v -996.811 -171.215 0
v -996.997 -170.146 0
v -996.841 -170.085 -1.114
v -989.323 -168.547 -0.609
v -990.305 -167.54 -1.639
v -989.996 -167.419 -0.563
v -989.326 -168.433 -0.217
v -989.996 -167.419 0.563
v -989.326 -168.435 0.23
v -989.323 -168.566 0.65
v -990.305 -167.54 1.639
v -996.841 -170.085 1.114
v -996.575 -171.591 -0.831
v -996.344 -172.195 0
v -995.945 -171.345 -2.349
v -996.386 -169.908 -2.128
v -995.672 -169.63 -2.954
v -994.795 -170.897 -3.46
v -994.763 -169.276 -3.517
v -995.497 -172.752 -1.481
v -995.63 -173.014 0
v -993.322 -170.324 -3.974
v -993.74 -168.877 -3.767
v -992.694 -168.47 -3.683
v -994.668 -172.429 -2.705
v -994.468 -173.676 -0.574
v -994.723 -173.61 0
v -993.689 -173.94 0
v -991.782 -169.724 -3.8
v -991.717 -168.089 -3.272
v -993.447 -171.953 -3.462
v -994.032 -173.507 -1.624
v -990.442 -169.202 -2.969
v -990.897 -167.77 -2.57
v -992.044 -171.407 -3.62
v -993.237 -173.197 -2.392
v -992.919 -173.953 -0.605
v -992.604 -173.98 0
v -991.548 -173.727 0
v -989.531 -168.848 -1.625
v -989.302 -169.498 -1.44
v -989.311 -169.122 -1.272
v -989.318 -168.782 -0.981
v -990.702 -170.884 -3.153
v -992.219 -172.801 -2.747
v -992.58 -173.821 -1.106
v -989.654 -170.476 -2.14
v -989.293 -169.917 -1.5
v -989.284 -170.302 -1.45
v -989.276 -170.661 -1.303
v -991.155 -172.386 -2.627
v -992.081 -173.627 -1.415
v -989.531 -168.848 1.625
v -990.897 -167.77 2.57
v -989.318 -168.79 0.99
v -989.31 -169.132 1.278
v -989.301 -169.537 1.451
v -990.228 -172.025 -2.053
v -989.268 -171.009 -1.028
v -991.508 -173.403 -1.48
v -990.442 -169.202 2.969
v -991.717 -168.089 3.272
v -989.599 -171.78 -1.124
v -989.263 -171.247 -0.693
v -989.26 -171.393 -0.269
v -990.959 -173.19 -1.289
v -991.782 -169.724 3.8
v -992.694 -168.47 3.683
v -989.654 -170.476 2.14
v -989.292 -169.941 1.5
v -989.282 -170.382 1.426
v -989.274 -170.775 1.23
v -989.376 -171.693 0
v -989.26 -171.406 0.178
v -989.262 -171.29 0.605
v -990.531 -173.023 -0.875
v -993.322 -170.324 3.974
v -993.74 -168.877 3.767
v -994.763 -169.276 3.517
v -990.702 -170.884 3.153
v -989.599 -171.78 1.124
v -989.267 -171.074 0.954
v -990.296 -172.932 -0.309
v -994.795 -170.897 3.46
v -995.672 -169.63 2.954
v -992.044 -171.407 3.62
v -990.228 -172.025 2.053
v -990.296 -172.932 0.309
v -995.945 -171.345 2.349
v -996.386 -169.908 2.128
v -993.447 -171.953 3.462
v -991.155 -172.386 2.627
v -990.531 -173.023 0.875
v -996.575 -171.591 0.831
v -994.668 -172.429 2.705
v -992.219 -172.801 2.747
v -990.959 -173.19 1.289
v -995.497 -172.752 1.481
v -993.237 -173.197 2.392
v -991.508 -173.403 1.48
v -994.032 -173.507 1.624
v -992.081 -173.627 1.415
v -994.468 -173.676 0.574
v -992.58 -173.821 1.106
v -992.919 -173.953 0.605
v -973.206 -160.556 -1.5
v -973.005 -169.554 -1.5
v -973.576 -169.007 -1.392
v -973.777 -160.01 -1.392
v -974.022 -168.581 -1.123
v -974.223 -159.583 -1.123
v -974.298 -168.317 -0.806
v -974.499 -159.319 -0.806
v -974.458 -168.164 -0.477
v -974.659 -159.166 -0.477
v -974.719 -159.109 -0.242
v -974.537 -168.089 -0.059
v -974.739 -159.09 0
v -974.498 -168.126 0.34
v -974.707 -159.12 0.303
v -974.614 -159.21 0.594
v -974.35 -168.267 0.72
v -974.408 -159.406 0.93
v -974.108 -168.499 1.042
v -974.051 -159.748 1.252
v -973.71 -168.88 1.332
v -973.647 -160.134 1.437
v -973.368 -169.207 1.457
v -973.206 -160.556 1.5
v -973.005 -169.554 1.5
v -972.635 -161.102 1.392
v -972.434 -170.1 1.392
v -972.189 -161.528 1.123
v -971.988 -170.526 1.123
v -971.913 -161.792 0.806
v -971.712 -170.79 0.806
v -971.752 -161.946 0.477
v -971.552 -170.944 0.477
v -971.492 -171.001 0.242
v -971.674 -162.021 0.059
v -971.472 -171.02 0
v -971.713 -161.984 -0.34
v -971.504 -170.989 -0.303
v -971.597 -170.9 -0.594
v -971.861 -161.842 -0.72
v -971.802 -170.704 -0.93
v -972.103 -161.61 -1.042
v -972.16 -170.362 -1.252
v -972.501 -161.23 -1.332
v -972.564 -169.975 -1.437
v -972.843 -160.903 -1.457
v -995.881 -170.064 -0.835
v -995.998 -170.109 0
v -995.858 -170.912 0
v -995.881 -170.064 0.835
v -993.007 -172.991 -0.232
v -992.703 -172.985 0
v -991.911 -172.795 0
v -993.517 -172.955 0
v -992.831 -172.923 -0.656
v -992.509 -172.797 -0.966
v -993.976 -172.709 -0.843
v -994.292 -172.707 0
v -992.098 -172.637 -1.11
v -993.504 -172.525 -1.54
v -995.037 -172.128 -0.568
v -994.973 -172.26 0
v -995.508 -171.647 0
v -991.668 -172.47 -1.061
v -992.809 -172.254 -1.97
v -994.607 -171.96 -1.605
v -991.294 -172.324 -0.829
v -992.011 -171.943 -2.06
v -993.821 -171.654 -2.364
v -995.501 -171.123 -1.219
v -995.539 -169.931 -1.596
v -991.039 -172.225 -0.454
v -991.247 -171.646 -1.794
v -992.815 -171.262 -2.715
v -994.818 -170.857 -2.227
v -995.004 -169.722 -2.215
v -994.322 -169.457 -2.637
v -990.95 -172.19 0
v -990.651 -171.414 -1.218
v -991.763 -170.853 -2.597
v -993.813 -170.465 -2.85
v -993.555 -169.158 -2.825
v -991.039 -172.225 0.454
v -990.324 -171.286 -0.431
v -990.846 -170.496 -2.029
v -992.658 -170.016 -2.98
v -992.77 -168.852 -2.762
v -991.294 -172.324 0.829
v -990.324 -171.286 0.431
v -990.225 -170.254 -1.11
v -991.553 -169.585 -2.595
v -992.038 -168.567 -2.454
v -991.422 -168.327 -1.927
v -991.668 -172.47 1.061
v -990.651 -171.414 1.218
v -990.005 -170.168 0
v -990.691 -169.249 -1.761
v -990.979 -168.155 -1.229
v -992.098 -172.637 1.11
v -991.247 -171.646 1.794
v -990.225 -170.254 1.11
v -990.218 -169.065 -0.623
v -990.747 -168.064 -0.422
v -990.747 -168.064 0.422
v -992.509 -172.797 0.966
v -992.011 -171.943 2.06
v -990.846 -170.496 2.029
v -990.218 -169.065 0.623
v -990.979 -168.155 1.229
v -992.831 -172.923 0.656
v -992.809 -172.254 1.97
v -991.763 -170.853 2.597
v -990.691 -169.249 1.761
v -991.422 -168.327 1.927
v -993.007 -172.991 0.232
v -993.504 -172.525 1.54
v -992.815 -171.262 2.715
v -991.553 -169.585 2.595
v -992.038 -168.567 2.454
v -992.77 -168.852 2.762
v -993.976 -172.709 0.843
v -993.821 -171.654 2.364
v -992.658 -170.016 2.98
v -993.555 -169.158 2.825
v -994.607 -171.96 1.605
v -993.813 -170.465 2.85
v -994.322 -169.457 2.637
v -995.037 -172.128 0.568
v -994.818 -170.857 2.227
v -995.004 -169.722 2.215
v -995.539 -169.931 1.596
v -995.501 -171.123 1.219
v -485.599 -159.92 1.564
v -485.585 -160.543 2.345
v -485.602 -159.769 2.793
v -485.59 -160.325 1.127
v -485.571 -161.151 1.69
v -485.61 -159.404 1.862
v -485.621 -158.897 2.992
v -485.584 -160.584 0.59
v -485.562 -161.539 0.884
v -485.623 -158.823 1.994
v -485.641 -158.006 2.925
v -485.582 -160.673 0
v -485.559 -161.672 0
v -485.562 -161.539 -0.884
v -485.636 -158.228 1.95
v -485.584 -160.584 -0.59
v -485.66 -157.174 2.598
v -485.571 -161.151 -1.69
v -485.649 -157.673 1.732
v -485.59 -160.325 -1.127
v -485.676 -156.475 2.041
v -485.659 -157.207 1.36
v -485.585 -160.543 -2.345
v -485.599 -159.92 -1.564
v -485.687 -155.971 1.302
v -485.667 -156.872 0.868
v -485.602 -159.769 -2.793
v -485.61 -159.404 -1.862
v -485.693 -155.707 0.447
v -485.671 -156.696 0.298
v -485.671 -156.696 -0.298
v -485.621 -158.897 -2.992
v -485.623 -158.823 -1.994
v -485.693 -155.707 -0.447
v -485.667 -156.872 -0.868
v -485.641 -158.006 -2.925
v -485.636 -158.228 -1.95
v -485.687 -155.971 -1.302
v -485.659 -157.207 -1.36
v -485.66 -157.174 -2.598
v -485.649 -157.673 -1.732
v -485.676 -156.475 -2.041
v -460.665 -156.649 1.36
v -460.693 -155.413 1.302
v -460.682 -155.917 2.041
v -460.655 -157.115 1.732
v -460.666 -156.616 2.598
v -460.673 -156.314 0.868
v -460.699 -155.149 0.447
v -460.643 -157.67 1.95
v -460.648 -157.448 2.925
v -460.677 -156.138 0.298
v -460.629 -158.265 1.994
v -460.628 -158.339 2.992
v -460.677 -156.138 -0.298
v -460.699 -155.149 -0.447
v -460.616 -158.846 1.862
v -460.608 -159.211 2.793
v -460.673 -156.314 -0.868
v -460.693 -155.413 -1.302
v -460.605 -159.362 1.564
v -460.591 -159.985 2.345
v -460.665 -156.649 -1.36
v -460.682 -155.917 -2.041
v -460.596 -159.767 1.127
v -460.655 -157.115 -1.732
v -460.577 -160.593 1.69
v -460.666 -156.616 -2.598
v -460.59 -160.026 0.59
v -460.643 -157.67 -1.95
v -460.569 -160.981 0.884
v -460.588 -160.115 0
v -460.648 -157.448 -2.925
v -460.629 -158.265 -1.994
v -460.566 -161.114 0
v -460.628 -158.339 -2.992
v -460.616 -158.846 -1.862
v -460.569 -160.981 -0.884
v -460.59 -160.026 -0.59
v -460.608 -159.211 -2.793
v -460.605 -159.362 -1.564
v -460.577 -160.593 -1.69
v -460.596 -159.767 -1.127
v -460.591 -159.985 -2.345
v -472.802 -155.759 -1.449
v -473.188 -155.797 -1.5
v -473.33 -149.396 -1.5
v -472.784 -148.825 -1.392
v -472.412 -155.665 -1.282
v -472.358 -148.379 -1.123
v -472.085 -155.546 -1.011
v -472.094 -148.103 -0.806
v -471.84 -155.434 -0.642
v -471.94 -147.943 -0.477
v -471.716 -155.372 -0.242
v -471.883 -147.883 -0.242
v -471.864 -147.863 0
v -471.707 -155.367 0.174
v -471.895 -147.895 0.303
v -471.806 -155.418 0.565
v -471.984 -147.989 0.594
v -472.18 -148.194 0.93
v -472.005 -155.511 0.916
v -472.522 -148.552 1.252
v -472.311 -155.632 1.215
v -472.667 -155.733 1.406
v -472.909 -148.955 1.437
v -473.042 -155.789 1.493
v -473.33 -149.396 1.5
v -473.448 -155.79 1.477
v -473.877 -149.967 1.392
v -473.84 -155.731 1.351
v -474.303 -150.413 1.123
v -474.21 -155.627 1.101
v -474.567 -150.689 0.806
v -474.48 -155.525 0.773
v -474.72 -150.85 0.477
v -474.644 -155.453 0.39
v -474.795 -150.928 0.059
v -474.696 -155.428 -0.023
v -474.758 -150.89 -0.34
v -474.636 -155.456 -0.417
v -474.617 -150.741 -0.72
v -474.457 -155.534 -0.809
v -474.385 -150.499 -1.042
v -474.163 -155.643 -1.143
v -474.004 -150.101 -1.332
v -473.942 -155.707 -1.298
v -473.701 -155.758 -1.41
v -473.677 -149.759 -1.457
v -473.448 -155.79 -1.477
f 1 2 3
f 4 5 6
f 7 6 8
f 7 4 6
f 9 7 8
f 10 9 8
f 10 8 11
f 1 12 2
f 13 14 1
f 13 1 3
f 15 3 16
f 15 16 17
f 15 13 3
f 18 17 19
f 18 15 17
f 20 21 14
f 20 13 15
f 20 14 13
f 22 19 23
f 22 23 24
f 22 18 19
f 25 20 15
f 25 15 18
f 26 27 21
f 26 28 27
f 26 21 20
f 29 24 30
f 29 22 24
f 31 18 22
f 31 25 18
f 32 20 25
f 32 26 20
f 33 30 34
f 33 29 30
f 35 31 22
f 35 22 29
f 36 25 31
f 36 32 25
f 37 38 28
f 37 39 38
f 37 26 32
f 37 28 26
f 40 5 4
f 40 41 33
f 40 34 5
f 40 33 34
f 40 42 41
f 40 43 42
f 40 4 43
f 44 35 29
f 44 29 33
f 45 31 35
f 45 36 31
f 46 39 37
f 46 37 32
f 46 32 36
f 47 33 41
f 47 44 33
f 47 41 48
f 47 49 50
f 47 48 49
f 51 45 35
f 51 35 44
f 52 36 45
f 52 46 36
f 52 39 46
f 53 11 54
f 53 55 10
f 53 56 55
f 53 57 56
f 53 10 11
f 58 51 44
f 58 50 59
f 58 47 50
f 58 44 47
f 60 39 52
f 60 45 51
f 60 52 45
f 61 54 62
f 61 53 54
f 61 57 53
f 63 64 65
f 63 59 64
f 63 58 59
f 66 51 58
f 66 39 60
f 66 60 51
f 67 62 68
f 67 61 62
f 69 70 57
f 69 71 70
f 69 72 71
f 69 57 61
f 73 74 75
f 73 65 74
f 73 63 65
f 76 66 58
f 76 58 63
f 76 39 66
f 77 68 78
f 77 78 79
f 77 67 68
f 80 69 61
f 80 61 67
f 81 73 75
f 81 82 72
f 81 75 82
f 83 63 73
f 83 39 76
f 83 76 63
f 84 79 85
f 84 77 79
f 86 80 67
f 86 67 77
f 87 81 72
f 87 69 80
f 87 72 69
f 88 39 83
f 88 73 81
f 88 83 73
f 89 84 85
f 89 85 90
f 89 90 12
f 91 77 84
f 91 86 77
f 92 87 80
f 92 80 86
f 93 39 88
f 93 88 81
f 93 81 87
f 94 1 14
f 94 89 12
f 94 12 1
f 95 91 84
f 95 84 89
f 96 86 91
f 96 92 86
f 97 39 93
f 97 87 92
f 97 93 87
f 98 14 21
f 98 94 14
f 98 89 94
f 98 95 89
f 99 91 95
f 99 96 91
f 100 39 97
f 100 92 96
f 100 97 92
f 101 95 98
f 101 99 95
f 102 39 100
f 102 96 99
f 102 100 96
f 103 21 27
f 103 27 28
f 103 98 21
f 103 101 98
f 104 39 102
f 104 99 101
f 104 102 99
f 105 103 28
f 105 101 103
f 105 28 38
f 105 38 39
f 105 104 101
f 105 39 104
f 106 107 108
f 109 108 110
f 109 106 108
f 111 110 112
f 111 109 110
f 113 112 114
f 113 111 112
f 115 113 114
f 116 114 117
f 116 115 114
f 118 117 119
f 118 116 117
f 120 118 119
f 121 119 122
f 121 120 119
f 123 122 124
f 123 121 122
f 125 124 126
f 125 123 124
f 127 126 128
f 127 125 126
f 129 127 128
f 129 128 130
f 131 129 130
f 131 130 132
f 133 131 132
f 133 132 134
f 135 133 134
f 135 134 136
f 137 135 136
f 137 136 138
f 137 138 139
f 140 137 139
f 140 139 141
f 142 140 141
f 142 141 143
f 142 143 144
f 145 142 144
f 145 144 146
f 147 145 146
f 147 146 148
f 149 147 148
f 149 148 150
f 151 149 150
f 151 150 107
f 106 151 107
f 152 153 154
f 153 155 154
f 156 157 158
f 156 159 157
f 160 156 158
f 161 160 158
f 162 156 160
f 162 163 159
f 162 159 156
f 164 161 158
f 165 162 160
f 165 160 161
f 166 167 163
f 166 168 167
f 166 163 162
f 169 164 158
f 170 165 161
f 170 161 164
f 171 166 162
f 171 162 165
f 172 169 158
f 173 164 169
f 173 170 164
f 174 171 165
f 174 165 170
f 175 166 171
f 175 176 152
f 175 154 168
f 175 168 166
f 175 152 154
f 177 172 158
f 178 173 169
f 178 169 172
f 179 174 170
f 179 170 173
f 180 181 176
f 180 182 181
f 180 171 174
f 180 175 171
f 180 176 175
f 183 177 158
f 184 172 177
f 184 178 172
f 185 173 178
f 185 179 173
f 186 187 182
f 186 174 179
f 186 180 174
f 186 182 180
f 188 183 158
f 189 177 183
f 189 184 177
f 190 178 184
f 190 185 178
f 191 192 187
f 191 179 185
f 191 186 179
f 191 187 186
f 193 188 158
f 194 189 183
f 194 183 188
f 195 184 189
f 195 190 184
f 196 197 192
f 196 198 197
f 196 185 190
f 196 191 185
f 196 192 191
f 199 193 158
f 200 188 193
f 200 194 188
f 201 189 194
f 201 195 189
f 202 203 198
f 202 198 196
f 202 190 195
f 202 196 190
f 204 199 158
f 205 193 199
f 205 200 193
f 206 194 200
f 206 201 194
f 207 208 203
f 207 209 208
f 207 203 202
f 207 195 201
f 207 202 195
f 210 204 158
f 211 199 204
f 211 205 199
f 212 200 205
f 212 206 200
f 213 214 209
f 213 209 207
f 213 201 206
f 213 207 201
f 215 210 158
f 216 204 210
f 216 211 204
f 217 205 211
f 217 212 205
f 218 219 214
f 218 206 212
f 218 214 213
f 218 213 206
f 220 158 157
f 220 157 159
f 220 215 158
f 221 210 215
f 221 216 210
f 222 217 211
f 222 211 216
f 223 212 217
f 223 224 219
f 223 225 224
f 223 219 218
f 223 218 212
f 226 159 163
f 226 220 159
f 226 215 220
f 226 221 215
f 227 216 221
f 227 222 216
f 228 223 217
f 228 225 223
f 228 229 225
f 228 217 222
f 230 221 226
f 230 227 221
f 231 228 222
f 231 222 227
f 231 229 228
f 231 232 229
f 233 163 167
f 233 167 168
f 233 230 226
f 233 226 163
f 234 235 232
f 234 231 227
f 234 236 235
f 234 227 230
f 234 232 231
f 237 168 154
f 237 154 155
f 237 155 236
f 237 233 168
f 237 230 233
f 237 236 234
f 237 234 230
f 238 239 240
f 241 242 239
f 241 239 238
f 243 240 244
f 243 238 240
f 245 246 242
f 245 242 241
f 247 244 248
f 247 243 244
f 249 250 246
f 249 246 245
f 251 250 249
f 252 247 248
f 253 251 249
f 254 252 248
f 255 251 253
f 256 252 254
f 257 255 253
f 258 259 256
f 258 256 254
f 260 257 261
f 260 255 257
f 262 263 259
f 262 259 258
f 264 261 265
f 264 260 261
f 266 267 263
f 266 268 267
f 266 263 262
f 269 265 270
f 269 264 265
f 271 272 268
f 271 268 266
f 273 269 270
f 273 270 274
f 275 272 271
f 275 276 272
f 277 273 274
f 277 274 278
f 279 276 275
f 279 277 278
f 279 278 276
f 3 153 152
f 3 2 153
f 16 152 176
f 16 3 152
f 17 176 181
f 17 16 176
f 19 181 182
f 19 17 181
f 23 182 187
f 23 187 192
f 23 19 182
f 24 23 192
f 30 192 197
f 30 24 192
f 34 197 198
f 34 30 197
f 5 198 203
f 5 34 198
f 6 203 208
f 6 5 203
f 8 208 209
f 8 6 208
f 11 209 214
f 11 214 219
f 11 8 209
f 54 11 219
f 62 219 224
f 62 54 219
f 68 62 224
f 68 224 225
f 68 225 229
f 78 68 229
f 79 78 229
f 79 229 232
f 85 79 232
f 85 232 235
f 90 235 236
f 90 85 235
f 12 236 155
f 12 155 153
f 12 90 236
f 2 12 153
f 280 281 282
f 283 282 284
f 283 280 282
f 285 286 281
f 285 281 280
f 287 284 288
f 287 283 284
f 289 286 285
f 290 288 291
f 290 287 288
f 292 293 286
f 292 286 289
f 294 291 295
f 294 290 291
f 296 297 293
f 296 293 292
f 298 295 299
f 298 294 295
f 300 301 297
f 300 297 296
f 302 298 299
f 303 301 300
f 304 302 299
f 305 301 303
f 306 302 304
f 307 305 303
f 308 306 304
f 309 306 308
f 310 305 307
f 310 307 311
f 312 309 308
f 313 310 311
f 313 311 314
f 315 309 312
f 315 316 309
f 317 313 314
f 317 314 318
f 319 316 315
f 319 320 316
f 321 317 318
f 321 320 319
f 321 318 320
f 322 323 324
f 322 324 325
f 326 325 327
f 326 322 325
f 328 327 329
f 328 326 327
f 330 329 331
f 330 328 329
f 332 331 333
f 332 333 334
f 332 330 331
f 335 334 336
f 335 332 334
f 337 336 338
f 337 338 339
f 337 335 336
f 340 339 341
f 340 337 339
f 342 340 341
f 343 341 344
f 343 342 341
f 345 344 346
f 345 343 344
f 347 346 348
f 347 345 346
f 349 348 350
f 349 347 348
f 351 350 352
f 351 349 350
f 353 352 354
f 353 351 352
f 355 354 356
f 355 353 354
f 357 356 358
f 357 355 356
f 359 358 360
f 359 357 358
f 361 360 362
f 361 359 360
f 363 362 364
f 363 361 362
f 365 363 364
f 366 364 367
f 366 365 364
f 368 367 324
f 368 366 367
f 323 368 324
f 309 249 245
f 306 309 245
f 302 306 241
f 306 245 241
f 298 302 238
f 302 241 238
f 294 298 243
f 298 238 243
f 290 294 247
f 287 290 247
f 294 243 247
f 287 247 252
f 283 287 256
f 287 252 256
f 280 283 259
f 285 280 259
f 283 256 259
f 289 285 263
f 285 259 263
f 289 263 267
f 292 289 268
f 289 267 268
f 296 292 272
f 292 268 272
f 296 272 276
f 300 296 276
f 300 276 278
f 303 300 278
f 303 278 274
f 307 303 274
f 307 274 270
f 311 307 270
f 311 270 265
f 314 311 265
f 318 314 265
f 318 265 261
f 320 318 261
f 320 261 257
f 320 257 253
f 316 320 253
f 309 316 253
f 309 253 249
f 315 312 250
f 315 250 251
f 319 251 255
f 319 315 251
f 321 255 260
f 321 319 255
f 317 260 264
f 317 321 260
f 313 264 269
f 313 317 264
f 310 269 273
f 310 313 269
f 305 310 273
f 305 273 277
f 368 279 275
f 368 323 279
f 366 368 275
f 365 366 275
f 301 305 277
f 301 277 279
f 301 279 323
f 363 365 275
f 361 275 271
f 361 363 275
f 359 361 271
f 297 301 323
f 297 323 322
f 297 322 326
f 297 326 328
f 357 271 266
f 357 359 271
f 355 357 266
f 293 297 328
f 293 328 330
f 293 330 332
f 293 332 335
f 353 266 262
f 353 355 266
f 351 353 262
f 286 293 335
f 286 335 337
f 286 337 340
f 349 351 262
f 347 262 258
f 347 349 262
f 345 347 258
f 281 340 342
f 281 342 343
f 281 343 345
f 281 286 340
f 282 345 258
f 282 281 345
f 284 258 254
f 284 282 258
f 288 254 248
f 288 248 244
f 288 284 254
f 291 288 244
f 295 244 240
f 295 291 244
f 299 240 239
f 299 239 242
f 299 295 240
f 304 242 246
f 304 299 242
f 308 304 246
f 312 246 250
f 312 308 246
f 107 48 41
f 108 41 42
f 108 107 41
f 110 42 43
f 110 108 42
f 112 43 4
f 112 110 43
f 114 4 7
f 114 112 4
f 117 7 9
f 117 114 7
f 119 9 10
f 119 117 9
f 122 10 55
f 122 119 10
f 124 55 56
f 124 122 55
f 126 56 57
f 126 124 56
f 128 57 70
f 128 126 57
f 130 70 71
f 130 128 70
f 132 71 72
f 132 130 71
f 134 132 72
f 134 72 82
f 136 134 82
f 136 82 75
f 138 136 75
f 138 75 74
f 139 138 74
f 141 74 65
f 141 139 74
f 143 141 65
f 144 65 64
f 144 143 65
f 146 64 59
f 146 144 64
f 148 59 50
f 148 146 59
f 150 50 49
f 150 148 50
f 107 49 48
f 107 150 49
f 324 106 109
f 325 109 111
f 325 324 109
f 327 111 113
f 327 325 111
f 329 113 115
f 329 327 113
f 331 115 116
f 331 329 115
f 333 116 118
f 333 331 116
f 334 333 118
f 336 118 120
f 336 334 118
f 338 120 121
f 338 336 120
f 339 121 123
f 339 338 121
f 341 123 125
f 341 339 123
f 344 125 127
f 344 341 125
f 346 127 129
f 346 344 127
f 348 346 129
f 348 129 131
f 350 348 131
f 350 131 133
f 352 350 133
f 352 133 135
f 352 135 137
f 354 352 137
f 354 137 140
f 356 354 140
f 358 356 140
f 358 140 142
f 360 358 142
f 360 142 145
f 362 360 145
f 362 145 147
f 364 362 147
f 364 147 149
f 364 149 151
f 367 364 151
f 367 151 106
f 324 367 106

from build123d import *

# Parameters (mm, degrees)
ESQUISSE5_R             = 1.5
ESQUISSE6_R             = 2
ENL_V_MAT_EXTRU_1_DEPTH = 527.198947189


with BuildPart() as part:
    # Esquisse3 → Révolution1 (revolve)
    with BuildSketch(Plane.XY, mode=Mode.PRIVATE) as r_volution1_sk:
        Polygon((-485.626417511, -158.673138472), (-485.693374328, -155.673885767), (-460.699601791, -155.115912293), (-460.632644974, -158.115164997), align=None)
    revolve(r_volution1_sk.sketch.rotate(Axis((-485.626417511, -158.673138472, 0), (0.9997509014565378, 0.022318938972096858, 0)), 180), axis=Axis((-485.626417511, -158.673138472, 0), (0.9997509014565378, 0.022318938972096858, 0)))

    # Balayage1: sweep along a path in Esquisse4
    with BuildLine(Plane.XY) as balayage1_path:
        Line((-990.000747296, -169.933043183), (-973.004981971, -169.553621221))
        Line((-973.004981971, -169.553621221), (-973.205852422, -160.555863107))
        Line((-973.205852422, -160.555863107), (-473.330401693, -149.396393621))
        Line((-473.330401693, -149.396393621), (-473.129531243, -158.394151735))
    # Esquisse5 → Balayage1 (sweep)
    with BuildSketch(Plane(origin=(-990.000747296, -169.933043183, 0), x_dir=(0, 0, -1), z_dir=(0.9997509014565377, 0.022318938972097663, 0))):
        Circle(ESQUISSE5_R)
    sweep(path=balayage1_path.line, transition=Transition.RIGHT)

    # Esquisse6 → Enlèv. mat.-Extru.1 (cut, through all)
    with BuildSketch(Plane(origin=(-488.92504391, -10.915007129, 0), x_dir=(0, 0, 1), z_dir=(-0.9997509014565378, -0.02231893897209691, 0))):
        with Locations(Location((0, -147.794946848, 0), (0, 0, 270))):
            Circle(ESQUISSE6_R)
    extrude(amount=-ENL_V_MAT_EXTRU_1_DEPTH, mode=Mode.SUBTRACT)

    # Esquisse7 → Révol.-Mince2 (revolve)
    with BuildSketch(Plane.XY, mode=Mode.PRIVATE) as r_vol_mince2_sk:
        with BuildLine():
            ThreePointArc((-991.911276333, -172.795475054), (-990.090729249, -170.732218342), (-990.71766112, -168.052969123))
            Line((-990.71766112, -168.052969123), (-989.956881493, -167.403958831))
            ThreePointArc((-989.956881493, -167.403958831), (-989.120972333, -170.976291122), (-991.548368445, -173.727300072))
            Line((-991.548368445, -173.727300072), (-991.911276333, -172.795475054))
        make_face()
    revolve(r_vol_mince2_sk.sketch.rotate(Axis((-994.088723667, -167.204524946, 0), (0.3629078888619865, -0.9318250180166533, 0)), 180), axis=Axis((-994.088723667, -167.204524946, 0), (0.3629078888619865, -0.9318250180166533, 0)))


solid = part.part
